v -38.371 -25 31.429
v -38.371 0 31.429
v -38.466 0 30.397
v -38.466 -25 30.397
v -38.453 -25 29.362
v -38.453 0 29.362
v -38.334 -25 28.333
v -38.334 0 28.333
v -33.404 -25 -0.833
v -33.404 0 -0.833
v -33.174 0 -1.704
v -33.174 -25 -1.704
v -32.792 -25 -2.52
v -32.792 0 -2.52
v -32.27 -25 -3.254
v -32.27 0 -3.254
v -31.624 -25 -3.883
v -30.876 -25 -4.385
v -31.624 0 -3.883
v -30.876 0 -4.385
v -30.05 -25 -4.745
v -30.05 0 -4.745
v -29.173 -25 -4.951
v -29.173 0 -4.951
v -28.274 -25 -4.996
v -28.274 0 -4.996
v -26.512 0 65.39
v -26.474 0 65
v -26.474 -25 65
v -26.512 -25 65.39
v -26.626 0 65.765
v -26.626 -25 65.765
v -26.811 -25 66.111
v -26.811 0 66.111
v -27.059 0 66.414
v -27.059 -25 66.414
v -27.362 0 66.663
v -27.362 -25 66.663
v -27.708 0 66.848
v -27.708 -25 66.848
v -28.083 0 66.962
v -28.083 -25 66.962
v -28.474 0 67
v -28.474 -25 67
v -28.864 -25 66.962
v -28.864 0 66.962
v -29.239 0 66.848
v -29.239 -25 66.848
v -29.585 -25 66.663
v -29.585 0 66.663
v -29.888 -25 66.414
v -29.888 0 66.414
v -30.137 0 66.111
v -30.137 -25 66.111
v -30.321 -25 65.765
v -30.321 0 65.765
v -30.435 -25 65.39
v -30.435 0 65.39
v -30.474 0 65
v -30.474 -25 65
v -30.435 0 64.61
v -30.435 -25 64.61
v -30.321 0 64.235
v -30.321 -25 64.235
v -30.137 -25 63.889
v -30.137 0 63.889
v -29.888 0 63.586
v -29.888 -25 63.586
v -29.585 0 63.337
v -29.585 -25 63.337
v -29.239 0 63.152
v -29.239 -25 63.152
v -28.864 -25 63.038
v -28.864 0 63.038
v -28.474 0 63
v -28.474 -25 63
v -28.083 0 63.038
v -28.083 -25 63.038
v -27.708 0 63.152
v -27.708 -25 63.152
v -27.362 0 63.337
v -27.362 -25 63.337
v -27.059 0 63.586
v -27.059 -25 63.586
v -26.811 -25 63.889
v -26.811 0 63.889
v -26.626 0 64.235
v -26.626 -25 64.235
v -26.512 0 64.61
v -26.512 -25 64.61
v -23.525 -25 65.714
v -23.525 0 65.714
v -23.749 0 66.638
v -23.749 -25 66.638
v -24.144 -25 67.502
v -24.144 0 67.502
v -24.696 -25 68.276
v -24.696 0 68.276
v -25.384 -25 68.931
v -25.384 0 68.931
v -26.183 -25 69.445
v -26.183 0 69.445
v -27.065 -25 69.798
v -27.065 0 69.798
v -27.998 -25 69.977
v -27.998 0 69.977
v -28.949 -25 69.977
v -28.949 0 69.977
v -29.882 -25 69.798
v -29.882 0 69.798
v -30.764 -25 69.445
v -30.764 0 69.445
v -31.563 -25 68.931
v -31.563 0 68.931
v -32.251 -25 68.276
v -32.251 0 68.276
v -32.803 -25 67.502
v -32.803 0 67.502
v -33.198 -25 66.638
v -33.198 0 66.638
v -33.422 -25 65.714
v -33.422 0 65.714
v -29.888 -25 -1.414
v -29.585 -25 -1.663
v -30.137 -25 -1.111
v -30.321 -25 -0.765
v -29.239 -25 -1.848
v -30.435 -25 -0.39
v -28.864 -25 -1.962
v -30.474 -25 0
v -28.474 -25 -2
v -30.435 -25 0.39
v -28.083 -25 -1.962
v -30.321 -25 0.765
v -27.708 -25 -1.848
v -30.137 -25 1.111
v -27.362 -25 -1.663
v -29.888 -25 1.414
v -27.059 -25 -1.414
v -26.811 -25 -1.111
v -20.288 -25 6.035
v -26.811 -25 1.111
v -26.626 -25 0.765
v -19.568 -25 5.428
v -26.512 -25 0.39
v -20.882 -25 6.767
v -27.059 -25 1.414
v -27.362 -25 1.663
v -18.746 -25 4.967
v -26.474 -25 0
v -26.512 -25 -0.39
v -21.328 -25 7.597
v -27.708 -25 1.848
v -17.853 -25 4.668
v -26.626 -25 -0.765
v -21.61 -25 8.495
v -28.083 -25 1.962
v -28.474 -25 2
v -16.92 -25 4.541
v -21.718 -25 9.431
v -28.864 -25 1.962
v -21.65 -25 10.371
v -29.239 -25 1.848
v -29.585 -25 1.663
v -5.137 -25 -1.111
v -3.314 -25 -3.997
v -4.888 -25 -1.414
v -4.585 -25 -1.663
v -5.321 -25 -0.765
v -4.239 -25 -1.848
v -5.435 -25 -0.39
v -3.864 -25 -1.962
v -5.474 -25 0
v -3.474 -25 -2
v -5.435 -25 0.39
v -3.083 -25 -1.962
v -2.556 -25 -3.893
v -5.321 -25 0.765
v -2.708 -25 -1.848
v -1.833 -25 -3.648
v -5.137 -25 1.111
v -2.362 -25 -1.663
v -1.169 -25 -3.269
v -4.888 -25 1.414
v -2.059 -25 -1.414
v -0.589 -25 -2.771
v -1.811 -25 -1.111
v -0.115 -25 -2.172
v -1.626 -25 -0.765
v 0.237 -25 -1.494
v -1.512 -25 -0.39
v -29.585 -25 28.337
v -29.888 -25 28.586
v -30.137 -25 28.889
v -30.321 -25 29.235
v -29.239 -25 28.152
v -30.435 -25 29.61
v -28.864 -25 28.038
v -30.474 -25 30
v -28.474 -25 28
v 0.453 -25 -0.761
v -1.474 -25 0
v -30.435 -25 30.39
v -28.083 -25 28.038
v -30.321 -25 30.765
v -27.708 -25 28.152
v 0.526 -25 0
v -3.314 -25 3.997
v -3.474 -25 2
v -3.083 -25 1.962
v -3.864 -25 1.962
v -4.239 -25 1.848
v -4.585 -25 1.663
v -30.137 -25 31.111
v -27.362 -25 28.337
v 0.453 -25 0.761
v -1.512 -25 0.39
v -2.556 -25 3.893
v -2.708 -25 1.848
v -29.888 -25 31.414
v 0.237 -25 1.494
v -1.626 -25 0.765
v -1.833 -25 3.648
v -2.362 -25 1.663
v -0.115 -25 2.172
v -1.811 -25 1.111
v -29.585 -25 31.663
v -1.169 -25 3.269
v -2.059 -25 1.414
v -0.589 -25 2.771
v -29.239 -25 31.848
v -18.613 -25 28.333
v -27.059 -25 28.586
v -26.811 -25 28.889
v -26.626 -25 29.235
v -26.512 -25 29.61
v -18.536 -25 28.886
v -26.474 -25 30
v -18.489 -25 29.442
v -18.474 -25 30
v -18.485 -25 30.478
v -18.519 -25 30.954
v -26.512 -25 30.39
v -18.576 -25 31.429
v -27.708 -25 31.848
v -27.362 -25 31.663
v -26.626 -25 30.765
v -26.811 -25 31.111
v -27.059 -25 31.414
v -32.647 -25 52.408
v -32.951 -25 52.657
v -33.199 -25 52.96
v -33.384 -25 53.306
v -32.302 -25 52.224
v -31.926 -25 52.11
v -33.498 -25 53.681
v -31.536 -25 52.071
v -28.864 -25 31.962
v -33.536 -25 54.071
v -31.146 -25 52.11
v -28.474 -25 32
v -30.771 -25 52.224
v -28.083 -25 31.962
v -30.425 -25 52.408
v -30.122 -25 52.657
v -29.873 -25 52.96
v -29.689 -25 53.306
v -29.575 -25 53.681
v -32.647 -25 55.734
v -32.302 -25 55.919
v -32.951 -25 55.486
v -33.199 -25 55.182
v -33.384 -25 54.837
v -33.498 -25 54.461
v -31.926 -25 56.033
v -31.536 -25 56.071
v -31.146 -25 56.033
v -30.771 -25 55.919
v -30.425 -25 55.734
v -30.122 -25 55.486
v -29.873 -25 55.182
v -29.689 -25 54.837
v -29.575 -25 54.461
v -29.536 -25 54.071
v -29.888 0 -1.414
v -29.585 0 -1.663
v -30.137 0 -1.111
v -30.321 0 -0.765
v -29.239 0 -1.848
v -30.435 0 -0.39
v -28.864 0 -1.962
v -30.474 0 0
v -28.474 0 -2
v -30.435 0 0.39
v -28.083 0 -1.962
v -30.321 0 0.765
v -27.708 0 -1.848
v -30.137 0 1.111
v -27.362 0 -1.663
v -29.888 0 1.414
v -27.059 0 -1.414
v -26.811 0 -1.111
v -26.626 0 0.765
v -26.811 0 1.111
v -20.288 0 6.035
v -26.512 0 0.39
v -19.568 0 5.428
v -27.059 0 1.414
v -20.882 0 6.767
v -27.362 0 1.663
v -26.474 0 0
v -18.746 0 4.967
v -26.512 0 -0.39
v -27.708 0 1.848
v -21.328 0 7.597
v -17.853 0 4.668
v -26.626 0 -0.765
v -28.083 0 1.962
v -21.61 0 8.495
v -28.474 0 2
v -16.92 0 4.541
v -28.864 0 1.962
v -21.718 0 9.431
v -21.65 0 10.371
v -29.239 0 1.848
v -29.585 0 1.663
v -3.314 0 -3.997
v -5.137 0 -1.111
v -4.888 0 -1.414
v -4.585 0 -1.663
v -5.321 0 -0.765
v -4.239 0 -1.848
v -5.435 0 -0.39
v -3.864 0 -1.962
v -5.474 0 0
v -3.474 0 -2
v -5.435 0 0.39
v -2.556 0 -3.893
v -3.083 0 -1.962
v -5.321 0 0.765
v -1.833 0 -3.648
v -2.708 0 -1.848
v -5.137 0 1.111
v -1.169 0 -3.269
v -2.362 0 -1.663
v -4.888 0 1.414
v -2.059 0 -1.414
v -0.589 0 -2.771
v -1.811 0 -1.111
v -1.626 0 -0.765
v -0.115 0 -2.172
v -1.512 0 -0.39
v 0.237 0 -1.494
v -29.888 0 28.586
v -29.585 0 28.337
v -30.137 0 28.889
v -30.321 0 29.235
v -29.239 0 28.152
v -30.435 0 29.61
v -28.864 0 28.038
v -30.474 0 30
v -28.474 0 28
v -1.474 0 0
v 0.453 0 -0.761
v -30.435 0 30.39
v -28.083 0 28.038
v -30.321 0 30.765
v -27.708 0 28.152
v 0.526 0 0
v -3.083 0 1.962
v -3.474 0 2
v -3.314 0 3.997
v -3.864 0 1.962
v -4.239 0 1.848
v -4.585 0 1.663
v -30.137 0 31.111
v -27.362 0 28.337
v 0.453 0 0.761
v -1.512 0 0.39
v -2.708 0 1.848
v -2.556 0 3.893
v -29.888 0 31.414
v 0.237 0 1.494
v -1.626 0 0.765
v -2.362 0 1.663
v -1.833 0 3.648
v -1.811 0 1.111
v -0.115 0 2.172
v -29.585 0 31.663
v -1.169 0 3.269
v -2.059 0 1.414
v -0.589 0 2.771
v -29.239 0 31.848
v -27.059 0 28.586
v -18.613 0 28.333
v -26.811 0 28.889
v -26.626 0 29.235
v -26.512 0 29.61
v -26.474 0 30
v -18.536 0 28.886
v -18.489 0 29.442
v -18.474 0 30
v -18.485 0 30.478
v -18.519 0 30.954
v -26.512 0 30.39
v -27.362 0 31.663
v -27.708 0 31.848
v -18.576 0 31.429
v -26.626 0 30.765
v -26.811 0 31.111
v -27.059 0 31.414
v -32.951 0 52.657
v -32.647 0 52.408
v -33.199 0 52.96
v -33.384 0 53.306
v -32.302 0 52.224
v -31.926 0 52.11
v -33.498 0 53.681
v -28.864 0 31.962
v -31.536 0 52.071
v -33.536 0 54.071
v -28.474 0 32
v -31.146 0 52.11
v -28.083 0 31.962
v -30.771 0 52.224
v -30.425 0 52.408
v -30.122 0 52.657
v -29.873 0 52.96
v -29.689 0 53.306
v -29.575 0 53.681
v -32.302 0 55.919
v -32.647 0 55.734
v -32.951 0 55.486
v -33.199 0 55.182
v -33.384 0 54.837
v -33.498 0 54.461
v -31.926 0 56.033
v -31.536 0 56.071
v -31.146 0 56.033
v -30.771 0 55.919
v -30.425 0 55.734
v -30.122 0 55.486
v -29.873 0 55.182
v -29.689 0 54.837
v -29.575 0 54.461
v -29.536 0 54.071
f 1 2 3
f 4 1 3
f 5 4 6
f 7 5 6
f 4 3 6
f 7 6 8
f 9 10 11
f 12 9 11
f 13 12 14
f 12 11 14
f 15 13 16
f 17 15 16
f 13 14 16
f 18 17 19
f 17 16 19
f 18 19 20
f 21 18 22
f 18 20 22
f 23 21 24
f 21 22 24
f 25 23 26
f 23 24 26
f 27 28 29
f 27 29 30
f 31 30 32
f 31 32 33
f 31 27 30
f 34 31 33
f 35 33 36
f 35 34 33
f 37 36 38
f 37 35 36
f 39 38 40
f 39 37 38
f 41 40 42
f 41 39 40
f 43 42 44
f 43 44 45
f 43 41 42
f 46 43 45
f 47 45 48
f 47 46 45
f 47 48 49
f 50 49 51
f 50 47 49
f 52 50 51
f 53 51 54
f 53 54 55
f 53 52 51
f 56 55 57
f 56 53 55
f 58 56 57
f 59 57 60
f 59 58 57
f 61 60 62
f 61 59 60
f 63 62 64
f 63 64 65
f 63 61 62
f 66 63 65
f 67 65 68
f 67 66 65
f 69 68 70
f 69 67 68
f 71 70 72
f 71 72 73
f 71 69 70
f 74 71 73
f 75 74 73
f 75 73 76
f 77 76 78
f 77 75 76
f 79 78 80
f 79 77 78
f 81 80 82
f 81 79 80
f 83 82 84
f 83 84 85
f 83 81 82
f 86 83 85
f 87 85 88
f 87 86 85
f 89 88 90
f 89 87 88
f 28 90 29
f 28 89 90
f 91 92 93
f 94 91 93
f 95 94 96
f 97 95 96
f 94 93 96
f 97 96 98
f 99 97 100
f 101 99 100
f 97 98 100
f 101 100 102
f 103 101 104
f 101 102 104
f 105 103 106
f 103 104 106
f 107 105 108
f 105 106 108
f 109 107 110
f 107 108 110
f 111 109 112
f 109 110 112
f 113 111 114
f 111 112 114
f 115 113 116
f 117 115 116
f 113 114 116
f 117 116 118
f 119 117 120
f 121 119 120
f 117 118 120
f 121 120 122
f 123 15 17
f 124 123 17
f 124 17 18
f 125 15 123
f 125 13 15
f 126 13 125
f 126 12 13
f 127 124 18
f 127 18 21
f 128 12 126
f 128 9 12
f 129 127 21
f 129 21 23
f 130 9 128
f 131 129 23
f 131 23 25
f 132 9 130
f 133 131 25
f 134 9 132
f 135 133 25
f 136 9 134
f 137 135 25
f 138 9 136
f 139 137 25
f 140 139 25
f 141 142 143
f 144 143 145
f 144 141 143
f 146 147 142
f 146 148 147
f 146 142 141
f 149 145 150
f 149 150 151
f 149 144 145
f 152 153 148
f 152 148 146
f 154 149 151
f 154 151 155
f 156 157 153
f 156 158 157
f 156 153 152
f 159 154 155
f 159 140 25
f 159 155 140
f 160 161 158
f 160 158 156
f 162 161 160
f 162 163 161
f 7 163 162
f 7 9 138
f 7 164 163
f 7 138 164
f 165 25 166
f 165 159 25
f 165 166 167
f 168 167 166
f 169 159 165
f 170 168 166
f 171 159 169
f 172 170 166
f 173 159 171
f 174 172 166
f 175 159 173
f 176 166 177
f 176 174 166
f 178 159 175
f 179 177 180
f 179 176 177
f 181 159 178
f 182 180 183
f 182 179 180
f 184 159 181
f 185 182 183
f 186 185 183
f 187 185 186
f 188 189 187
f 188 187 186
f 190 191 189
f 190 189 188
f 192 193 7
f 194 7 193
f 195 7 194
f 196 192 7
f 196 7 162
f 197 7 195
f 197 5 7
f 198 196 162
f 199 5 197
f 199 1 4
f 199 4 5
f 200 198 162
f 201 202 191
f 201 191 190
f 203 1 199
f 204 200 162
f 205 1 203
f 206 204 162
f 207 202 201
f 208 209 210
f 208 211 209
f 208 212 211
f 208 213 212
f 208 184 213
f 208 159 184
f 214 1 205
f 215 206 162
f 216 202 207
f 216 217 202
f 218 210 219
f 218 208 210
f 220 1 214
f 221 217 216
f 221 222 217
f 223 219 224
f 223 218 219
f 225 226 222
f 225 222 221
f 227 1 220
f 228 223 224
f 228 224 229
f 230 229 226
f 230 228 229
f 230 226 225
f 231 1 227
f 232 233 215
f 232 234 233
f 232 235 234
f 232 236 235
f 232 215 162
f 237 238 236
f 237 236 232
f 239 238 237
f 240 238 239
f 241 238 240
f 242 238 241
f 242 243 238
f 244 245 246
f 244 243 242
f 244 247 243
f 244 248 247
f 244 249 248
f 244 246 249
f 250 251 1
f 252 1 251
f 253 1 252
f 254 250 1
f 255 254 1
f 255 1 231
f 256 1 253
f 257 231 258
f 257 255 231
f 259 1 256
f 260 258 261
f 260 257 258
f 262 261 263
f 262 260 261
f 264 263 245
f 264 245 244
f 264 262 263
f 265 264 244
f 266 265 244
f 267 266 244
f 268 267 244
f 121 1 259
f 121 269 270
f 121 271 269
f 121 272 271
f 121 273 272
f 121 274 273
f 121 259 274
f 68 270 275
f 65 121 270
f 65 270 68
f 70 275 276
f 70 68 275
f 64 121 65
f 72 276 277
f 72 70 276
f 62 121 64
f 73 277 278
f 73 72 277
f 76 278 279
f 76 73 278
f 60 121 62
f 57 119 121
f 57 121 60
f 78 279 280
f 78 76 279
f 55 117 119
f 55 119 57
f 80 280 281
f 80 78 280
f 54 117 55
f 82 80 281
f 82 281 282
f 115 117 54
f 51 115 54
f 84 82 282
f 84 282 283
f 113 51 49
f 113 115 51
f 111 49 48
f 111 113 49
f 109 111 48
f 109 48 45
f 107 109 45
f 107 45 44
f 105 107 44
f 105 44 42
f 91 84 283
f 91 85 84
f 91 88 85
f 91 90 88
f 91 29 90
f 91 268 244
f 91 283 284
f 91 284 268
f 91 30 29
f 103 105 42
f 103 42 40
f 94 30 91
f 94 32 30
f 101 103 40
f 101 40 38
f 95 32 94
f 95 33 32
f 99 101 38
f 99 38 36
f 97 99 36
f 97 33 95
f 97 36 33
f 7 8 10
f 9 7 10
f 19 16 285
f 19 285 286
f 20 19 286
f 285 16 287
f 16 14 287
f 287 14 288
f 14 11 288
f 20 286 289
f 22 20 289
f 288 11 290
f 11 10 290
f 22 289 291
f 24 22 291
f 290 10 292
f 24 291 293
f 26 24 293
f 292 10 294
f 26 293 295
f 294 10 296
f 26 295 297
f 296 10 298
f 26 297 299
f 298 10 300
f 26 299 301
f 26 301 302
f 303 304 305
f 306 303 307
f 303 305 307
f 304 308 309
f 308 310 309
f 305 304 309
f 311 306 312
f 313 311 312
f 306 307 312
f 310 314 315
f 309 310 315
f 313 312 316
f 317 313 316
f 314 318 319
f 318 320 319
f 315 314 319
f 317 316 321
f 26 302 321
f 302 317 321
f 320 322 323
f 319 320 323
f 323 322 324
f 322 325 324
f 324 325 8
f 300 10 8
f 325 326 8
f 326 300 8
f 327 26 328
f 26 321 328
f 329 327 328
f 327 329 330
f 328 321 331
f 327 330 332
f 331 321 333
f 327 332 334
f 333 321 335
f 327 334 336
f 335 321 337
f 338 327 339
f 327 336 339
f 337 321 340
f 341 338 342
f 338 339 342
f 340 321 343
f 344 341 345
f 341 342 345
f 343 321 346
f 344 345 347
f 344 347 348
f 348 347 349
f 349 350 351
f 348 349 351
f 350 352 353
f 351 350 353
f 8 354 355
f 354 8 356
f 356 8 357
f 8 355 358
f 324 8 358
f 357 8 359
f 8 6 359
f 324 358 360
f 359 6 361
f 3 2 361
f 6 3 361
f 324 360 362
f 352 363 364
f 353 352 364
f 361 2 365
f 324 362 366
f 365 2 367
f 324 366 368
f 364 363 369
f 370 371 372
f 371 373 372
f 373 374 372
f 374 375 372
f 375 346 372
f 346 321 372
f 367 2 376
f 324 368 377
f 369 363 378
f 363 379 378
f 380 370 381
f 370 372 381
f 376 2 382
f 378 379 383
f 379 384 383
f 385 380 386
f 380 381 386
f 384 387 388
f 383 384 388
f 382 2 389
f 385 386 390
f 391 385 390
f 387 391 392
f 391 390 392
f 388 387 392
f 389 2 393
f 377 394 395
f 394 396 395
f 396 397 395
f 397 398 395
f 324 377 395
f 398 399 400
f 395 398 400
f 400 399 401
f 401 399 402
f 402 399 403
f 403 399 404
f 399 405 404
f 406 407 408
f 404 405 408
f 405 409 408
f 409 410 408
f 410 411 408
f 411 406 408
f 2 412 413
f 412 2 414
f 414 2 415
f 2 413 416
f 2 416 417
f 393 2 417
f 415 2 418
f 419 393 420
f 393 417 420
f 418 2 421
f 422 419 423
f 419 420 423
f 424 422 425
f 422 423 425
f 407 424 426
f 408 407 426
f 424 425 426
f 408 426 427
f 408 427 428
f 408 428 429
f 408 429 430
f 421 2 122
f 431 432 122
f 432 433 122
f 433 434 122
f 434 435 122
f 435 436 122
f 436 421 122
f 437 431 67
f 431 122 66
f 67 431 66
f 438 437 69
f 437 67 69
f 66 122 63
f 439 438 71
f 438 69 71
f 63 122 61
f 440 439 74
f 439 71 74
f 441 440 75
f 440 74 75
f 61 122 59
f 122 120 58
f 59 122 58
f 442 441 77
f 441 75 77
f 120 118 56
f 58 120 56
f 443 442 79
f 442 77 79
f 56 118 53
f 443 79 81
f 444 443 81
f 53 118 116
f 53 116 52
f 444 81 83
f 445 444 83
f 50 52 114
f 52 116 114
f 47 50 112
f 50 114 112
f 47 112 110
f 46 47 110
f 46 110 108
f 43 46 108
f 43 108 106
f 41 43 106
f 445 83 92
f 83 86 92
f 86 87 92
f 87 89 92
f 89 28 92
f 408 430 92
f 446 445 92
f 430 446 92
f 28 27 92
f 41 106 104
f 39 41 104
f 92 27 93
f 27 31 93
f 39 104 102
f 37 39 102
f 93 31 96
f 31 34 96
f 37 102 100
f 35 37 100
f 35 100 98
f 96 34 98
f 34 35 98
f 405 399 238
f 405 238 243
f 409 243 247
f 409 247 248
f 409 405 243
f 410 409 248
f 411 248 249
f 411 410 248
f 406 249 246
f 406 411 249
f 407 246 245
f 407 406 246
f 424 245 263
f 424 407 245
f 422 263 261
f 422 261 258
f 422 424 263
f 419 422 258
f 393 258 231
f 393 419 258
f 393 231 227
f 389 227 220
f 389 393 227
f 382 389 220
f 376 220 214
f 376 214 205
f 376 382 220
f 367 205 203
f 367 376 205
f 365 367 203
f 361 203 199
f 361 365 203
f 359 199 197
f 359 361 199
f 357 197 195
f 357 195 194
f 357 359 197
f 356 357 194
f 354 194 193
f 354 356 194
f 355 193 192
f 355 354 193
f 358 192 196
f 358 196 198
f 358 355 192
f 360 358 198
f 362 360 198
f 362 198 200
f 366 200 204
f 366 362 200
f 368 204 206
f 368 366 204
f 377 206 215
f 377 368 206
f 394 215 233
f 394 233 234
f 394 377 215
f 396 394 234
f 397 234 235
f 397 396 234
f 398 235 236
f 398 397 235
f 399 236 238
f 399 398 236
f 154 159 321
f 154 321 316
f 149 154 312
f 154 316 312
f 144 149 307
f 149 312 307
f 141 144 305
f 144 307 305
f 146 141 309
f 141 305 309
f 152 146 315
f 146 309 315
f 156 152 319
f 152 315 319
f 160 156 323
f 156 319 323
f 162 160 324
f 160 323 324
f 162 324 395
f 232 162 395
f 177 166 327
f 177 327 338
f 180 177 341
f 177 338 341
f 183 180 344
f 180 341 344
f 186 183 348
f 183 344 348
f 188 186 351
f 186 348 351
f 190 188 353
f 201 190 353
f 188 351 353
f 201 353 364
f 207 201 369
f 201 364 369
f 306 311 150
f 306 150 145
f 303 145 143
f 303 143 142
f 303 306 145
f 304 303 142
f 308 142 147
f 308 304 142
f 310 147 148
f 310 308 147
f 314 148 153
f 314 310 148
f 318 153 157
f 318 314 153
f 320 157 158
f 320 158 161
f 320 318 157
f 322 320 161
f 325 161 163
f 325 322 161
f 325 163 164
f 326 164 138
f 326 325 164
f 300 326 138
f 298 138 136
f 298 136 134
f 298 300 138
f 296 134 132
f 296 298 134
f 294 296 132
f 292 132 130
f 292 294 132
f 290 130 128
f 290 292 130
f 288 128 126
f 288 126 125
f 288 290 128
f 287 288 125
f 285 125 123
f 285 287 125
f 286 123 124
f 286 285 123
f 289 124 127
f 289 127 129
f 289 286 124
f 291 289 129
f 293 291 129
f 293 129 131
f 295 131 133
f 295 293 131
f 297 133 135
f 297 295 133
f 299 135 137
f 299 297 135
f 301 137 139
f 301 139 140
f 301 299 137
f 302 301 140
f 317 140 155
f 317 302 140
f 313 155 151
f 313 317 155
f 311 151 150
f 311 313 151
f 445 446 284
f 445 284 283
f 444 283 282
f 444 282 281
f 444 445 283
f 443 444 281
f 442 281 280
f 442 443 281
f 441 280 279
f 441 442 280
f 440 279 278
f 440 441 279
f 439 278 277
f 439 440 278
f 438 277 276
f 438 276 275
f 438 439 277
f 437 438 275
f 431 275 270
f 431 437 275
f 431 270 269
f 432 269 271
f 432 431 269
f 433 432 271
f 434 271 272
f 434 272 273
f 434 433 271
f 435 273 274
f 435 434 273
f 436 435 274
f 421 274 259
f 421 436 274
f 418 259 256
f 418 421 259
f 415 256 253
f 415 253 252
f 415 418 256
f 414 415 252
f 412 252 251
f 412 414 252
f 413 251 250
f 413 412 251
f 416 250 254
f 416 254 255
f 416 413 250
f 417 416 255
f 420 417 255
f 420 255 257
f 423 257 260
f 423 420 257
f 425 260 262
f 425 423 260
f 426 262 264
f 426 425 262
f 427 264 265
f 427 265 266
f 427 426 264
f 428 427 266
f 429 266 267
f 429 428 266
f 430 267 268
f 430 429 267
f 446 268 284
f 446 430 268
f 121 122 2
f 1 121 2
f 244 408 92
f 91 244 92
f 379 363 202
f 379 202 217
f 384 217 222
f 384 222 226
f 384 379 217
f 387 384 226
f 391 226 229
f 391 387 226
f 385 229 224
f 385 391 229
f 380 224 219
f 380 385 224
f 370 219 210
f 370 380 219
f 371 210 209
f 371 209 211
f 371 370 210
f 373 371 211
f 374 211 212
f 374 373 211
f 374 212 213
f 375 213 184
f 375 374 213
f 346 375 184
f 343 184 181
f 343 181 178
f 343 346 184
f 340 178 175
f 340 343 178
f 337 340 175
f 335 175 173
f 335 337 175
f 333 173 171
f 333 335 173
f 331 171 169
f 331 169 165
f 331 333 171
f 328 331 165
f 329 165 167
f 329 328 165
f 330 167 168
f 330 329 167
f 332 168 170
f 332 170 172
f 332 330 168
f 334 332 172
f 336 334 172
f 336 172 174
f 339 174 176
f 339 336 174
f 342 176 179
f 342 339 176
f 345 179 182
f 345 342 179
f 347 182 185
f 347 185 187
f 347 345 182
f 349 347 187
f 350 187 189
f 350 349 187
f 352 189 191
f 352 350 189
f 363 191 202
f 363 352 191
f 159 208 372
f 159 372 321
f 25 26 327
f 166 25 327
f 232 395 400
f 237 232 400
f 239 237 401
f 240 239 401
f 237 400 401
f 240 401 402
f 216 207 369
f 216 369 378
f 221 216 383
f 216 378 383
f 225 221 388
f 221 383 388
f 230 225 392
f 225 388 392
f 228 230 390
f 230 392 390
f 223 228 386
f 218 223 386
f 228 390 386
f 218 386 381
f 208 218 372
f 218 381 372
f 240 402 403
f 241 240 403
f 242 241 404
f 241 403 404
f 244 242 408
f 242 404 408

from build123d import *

# Parameters (mm, degrees)
F0_R     = 2
F1_DEPTH = 25


with BuildPart() as f1:
    # F0 (on Front) → F1 (new body)
    with BuildSketch(Plane.XZ):
        with BuildLine():
            ThreePointArc((-3.313569, -3.996799), (-7.473569, 0), (-3.313569, 3.996799))
            Line((-3.313569, 3.996799), (-16.919591, 4.541475))
            ThreePointArc((-16.919591, 4.541475), (-20.602202, 6.387025), (-21.649657, 10.370807))
            Line((-21.649657, 10.370807), (-18.613436, 28.333333))
            ThreePointArc((-18.613436, 28.333333), (-28.473569, 20), (-38.333702, 28.333333))
            Line((-38.333702, 28.333333), (-33.403636, -0.833333))
            ThreePointArc((-33.403636, -0.833333), (-28.8917, 4.982486), (-23.473569, 0))
            ThreePointArc((-23.473569, 0), (-24.868018, -3.464102), (-28.273569, -4.995998))
            Line((-28.273569, -4.995998), (-3.313569, -3.996799))
        make_face()
        with BuildLine():
            ThreePointArc((-33.403636, -0.833333), (-31.624018, -3.882612), (-28.273569, -4.995998))
            ThreePointArc((-28.273569, -4.995998), (-24.868018, -3.464102), (-23.473569, 0))
            ThreePointArc((-23.473569, 0), (-28.8917, 4.982486), (-33.403636, -0.833333))
        make_face()
        with Locations((-28.473569, 0)):
            Circle(F0_R, mode=Mode.SUBTRACT)
        with BuildLine():
            ThreePointArc((-3.313569, -3.996799), (-0.589128, -2.771281), (0.526431, 0))
            ThreePointArc((0.526431, 0), (-0.589128, 2.771281), (-3.313569, 3.996799))
            ThreePointArc((-3.313569, 3.996799), (-7.473569, 0), (-3.313569, -3.996799))
        make_face()
        with Locations((-3.473569, 0)):
            Circle(F0_R, mode=Mode.SUBTRACT)
        with BuildLine():
            ThreePointArc((-38.333702, 28.333333), (-28.473569, 20), (-18.613436, 28.333333))
            ThreePointArc((-18.613436, 28.333333), (-18.508597, 29.163737), (-18.473569, 30))
            ThreePointArc((-18.473569, 30), (-18.499244, 30.716124), (-18.576136, 31.428571))
            ThreePointArc((-18.576136, 31.428571), (-28.473569, 40), (-38.371002, 31.428571))
            ThreePointArc((-38.371002, 31.428571), (-38.472843, 29.8795), (-38.333702, 28.333333))
        make_face()
        with Locations((-28.473569, 30)):
            Circle(F0_R, mode=Mode.SUBTRACT)
        with BuildLine():
            Line((-33.422286, 65.714286), (-38.371002, 31.428571))
            ThreePointArc((-38.371002, 31.428571), (-28.473569, 40), (-18.576136, 31.428571))
            Line((-18.576136, 31.428571), (-23.524852, 65.714286))
            ThreePointArc((-23.524852, 65.714286), (-23.486406, 65.358062), (-23.473569, 65))
            ThreePointArc((-23.473569, 65), (-28.831631, 60.012837), (-33.422286, 65.714286))
        make_face()
        with Locations((-31.536311, 54.071311)):
            Circle(F0_R, mode=Mode.SUBTRACT)
        with BuildLine():
            ThreePointArc((-23.524852, 65.714286), (-28.473569, 70), (-33.422286, 65.714286))
            ThreePointArc((-33.422286, 65.714286), (-28.831631, 60.012837), (-23.473569, 65))
            ThreePointArc((-23.473569, 65), (-23.486406, 65.358062), (-23.524852, 65.714286))
        make_face()
        with Locations((-28.473569, 65)):
            Circle(F0_R, mode=Mode.SUBTRACT)
    extrude(amount=F1_DEPTH)


solid = f1.part
